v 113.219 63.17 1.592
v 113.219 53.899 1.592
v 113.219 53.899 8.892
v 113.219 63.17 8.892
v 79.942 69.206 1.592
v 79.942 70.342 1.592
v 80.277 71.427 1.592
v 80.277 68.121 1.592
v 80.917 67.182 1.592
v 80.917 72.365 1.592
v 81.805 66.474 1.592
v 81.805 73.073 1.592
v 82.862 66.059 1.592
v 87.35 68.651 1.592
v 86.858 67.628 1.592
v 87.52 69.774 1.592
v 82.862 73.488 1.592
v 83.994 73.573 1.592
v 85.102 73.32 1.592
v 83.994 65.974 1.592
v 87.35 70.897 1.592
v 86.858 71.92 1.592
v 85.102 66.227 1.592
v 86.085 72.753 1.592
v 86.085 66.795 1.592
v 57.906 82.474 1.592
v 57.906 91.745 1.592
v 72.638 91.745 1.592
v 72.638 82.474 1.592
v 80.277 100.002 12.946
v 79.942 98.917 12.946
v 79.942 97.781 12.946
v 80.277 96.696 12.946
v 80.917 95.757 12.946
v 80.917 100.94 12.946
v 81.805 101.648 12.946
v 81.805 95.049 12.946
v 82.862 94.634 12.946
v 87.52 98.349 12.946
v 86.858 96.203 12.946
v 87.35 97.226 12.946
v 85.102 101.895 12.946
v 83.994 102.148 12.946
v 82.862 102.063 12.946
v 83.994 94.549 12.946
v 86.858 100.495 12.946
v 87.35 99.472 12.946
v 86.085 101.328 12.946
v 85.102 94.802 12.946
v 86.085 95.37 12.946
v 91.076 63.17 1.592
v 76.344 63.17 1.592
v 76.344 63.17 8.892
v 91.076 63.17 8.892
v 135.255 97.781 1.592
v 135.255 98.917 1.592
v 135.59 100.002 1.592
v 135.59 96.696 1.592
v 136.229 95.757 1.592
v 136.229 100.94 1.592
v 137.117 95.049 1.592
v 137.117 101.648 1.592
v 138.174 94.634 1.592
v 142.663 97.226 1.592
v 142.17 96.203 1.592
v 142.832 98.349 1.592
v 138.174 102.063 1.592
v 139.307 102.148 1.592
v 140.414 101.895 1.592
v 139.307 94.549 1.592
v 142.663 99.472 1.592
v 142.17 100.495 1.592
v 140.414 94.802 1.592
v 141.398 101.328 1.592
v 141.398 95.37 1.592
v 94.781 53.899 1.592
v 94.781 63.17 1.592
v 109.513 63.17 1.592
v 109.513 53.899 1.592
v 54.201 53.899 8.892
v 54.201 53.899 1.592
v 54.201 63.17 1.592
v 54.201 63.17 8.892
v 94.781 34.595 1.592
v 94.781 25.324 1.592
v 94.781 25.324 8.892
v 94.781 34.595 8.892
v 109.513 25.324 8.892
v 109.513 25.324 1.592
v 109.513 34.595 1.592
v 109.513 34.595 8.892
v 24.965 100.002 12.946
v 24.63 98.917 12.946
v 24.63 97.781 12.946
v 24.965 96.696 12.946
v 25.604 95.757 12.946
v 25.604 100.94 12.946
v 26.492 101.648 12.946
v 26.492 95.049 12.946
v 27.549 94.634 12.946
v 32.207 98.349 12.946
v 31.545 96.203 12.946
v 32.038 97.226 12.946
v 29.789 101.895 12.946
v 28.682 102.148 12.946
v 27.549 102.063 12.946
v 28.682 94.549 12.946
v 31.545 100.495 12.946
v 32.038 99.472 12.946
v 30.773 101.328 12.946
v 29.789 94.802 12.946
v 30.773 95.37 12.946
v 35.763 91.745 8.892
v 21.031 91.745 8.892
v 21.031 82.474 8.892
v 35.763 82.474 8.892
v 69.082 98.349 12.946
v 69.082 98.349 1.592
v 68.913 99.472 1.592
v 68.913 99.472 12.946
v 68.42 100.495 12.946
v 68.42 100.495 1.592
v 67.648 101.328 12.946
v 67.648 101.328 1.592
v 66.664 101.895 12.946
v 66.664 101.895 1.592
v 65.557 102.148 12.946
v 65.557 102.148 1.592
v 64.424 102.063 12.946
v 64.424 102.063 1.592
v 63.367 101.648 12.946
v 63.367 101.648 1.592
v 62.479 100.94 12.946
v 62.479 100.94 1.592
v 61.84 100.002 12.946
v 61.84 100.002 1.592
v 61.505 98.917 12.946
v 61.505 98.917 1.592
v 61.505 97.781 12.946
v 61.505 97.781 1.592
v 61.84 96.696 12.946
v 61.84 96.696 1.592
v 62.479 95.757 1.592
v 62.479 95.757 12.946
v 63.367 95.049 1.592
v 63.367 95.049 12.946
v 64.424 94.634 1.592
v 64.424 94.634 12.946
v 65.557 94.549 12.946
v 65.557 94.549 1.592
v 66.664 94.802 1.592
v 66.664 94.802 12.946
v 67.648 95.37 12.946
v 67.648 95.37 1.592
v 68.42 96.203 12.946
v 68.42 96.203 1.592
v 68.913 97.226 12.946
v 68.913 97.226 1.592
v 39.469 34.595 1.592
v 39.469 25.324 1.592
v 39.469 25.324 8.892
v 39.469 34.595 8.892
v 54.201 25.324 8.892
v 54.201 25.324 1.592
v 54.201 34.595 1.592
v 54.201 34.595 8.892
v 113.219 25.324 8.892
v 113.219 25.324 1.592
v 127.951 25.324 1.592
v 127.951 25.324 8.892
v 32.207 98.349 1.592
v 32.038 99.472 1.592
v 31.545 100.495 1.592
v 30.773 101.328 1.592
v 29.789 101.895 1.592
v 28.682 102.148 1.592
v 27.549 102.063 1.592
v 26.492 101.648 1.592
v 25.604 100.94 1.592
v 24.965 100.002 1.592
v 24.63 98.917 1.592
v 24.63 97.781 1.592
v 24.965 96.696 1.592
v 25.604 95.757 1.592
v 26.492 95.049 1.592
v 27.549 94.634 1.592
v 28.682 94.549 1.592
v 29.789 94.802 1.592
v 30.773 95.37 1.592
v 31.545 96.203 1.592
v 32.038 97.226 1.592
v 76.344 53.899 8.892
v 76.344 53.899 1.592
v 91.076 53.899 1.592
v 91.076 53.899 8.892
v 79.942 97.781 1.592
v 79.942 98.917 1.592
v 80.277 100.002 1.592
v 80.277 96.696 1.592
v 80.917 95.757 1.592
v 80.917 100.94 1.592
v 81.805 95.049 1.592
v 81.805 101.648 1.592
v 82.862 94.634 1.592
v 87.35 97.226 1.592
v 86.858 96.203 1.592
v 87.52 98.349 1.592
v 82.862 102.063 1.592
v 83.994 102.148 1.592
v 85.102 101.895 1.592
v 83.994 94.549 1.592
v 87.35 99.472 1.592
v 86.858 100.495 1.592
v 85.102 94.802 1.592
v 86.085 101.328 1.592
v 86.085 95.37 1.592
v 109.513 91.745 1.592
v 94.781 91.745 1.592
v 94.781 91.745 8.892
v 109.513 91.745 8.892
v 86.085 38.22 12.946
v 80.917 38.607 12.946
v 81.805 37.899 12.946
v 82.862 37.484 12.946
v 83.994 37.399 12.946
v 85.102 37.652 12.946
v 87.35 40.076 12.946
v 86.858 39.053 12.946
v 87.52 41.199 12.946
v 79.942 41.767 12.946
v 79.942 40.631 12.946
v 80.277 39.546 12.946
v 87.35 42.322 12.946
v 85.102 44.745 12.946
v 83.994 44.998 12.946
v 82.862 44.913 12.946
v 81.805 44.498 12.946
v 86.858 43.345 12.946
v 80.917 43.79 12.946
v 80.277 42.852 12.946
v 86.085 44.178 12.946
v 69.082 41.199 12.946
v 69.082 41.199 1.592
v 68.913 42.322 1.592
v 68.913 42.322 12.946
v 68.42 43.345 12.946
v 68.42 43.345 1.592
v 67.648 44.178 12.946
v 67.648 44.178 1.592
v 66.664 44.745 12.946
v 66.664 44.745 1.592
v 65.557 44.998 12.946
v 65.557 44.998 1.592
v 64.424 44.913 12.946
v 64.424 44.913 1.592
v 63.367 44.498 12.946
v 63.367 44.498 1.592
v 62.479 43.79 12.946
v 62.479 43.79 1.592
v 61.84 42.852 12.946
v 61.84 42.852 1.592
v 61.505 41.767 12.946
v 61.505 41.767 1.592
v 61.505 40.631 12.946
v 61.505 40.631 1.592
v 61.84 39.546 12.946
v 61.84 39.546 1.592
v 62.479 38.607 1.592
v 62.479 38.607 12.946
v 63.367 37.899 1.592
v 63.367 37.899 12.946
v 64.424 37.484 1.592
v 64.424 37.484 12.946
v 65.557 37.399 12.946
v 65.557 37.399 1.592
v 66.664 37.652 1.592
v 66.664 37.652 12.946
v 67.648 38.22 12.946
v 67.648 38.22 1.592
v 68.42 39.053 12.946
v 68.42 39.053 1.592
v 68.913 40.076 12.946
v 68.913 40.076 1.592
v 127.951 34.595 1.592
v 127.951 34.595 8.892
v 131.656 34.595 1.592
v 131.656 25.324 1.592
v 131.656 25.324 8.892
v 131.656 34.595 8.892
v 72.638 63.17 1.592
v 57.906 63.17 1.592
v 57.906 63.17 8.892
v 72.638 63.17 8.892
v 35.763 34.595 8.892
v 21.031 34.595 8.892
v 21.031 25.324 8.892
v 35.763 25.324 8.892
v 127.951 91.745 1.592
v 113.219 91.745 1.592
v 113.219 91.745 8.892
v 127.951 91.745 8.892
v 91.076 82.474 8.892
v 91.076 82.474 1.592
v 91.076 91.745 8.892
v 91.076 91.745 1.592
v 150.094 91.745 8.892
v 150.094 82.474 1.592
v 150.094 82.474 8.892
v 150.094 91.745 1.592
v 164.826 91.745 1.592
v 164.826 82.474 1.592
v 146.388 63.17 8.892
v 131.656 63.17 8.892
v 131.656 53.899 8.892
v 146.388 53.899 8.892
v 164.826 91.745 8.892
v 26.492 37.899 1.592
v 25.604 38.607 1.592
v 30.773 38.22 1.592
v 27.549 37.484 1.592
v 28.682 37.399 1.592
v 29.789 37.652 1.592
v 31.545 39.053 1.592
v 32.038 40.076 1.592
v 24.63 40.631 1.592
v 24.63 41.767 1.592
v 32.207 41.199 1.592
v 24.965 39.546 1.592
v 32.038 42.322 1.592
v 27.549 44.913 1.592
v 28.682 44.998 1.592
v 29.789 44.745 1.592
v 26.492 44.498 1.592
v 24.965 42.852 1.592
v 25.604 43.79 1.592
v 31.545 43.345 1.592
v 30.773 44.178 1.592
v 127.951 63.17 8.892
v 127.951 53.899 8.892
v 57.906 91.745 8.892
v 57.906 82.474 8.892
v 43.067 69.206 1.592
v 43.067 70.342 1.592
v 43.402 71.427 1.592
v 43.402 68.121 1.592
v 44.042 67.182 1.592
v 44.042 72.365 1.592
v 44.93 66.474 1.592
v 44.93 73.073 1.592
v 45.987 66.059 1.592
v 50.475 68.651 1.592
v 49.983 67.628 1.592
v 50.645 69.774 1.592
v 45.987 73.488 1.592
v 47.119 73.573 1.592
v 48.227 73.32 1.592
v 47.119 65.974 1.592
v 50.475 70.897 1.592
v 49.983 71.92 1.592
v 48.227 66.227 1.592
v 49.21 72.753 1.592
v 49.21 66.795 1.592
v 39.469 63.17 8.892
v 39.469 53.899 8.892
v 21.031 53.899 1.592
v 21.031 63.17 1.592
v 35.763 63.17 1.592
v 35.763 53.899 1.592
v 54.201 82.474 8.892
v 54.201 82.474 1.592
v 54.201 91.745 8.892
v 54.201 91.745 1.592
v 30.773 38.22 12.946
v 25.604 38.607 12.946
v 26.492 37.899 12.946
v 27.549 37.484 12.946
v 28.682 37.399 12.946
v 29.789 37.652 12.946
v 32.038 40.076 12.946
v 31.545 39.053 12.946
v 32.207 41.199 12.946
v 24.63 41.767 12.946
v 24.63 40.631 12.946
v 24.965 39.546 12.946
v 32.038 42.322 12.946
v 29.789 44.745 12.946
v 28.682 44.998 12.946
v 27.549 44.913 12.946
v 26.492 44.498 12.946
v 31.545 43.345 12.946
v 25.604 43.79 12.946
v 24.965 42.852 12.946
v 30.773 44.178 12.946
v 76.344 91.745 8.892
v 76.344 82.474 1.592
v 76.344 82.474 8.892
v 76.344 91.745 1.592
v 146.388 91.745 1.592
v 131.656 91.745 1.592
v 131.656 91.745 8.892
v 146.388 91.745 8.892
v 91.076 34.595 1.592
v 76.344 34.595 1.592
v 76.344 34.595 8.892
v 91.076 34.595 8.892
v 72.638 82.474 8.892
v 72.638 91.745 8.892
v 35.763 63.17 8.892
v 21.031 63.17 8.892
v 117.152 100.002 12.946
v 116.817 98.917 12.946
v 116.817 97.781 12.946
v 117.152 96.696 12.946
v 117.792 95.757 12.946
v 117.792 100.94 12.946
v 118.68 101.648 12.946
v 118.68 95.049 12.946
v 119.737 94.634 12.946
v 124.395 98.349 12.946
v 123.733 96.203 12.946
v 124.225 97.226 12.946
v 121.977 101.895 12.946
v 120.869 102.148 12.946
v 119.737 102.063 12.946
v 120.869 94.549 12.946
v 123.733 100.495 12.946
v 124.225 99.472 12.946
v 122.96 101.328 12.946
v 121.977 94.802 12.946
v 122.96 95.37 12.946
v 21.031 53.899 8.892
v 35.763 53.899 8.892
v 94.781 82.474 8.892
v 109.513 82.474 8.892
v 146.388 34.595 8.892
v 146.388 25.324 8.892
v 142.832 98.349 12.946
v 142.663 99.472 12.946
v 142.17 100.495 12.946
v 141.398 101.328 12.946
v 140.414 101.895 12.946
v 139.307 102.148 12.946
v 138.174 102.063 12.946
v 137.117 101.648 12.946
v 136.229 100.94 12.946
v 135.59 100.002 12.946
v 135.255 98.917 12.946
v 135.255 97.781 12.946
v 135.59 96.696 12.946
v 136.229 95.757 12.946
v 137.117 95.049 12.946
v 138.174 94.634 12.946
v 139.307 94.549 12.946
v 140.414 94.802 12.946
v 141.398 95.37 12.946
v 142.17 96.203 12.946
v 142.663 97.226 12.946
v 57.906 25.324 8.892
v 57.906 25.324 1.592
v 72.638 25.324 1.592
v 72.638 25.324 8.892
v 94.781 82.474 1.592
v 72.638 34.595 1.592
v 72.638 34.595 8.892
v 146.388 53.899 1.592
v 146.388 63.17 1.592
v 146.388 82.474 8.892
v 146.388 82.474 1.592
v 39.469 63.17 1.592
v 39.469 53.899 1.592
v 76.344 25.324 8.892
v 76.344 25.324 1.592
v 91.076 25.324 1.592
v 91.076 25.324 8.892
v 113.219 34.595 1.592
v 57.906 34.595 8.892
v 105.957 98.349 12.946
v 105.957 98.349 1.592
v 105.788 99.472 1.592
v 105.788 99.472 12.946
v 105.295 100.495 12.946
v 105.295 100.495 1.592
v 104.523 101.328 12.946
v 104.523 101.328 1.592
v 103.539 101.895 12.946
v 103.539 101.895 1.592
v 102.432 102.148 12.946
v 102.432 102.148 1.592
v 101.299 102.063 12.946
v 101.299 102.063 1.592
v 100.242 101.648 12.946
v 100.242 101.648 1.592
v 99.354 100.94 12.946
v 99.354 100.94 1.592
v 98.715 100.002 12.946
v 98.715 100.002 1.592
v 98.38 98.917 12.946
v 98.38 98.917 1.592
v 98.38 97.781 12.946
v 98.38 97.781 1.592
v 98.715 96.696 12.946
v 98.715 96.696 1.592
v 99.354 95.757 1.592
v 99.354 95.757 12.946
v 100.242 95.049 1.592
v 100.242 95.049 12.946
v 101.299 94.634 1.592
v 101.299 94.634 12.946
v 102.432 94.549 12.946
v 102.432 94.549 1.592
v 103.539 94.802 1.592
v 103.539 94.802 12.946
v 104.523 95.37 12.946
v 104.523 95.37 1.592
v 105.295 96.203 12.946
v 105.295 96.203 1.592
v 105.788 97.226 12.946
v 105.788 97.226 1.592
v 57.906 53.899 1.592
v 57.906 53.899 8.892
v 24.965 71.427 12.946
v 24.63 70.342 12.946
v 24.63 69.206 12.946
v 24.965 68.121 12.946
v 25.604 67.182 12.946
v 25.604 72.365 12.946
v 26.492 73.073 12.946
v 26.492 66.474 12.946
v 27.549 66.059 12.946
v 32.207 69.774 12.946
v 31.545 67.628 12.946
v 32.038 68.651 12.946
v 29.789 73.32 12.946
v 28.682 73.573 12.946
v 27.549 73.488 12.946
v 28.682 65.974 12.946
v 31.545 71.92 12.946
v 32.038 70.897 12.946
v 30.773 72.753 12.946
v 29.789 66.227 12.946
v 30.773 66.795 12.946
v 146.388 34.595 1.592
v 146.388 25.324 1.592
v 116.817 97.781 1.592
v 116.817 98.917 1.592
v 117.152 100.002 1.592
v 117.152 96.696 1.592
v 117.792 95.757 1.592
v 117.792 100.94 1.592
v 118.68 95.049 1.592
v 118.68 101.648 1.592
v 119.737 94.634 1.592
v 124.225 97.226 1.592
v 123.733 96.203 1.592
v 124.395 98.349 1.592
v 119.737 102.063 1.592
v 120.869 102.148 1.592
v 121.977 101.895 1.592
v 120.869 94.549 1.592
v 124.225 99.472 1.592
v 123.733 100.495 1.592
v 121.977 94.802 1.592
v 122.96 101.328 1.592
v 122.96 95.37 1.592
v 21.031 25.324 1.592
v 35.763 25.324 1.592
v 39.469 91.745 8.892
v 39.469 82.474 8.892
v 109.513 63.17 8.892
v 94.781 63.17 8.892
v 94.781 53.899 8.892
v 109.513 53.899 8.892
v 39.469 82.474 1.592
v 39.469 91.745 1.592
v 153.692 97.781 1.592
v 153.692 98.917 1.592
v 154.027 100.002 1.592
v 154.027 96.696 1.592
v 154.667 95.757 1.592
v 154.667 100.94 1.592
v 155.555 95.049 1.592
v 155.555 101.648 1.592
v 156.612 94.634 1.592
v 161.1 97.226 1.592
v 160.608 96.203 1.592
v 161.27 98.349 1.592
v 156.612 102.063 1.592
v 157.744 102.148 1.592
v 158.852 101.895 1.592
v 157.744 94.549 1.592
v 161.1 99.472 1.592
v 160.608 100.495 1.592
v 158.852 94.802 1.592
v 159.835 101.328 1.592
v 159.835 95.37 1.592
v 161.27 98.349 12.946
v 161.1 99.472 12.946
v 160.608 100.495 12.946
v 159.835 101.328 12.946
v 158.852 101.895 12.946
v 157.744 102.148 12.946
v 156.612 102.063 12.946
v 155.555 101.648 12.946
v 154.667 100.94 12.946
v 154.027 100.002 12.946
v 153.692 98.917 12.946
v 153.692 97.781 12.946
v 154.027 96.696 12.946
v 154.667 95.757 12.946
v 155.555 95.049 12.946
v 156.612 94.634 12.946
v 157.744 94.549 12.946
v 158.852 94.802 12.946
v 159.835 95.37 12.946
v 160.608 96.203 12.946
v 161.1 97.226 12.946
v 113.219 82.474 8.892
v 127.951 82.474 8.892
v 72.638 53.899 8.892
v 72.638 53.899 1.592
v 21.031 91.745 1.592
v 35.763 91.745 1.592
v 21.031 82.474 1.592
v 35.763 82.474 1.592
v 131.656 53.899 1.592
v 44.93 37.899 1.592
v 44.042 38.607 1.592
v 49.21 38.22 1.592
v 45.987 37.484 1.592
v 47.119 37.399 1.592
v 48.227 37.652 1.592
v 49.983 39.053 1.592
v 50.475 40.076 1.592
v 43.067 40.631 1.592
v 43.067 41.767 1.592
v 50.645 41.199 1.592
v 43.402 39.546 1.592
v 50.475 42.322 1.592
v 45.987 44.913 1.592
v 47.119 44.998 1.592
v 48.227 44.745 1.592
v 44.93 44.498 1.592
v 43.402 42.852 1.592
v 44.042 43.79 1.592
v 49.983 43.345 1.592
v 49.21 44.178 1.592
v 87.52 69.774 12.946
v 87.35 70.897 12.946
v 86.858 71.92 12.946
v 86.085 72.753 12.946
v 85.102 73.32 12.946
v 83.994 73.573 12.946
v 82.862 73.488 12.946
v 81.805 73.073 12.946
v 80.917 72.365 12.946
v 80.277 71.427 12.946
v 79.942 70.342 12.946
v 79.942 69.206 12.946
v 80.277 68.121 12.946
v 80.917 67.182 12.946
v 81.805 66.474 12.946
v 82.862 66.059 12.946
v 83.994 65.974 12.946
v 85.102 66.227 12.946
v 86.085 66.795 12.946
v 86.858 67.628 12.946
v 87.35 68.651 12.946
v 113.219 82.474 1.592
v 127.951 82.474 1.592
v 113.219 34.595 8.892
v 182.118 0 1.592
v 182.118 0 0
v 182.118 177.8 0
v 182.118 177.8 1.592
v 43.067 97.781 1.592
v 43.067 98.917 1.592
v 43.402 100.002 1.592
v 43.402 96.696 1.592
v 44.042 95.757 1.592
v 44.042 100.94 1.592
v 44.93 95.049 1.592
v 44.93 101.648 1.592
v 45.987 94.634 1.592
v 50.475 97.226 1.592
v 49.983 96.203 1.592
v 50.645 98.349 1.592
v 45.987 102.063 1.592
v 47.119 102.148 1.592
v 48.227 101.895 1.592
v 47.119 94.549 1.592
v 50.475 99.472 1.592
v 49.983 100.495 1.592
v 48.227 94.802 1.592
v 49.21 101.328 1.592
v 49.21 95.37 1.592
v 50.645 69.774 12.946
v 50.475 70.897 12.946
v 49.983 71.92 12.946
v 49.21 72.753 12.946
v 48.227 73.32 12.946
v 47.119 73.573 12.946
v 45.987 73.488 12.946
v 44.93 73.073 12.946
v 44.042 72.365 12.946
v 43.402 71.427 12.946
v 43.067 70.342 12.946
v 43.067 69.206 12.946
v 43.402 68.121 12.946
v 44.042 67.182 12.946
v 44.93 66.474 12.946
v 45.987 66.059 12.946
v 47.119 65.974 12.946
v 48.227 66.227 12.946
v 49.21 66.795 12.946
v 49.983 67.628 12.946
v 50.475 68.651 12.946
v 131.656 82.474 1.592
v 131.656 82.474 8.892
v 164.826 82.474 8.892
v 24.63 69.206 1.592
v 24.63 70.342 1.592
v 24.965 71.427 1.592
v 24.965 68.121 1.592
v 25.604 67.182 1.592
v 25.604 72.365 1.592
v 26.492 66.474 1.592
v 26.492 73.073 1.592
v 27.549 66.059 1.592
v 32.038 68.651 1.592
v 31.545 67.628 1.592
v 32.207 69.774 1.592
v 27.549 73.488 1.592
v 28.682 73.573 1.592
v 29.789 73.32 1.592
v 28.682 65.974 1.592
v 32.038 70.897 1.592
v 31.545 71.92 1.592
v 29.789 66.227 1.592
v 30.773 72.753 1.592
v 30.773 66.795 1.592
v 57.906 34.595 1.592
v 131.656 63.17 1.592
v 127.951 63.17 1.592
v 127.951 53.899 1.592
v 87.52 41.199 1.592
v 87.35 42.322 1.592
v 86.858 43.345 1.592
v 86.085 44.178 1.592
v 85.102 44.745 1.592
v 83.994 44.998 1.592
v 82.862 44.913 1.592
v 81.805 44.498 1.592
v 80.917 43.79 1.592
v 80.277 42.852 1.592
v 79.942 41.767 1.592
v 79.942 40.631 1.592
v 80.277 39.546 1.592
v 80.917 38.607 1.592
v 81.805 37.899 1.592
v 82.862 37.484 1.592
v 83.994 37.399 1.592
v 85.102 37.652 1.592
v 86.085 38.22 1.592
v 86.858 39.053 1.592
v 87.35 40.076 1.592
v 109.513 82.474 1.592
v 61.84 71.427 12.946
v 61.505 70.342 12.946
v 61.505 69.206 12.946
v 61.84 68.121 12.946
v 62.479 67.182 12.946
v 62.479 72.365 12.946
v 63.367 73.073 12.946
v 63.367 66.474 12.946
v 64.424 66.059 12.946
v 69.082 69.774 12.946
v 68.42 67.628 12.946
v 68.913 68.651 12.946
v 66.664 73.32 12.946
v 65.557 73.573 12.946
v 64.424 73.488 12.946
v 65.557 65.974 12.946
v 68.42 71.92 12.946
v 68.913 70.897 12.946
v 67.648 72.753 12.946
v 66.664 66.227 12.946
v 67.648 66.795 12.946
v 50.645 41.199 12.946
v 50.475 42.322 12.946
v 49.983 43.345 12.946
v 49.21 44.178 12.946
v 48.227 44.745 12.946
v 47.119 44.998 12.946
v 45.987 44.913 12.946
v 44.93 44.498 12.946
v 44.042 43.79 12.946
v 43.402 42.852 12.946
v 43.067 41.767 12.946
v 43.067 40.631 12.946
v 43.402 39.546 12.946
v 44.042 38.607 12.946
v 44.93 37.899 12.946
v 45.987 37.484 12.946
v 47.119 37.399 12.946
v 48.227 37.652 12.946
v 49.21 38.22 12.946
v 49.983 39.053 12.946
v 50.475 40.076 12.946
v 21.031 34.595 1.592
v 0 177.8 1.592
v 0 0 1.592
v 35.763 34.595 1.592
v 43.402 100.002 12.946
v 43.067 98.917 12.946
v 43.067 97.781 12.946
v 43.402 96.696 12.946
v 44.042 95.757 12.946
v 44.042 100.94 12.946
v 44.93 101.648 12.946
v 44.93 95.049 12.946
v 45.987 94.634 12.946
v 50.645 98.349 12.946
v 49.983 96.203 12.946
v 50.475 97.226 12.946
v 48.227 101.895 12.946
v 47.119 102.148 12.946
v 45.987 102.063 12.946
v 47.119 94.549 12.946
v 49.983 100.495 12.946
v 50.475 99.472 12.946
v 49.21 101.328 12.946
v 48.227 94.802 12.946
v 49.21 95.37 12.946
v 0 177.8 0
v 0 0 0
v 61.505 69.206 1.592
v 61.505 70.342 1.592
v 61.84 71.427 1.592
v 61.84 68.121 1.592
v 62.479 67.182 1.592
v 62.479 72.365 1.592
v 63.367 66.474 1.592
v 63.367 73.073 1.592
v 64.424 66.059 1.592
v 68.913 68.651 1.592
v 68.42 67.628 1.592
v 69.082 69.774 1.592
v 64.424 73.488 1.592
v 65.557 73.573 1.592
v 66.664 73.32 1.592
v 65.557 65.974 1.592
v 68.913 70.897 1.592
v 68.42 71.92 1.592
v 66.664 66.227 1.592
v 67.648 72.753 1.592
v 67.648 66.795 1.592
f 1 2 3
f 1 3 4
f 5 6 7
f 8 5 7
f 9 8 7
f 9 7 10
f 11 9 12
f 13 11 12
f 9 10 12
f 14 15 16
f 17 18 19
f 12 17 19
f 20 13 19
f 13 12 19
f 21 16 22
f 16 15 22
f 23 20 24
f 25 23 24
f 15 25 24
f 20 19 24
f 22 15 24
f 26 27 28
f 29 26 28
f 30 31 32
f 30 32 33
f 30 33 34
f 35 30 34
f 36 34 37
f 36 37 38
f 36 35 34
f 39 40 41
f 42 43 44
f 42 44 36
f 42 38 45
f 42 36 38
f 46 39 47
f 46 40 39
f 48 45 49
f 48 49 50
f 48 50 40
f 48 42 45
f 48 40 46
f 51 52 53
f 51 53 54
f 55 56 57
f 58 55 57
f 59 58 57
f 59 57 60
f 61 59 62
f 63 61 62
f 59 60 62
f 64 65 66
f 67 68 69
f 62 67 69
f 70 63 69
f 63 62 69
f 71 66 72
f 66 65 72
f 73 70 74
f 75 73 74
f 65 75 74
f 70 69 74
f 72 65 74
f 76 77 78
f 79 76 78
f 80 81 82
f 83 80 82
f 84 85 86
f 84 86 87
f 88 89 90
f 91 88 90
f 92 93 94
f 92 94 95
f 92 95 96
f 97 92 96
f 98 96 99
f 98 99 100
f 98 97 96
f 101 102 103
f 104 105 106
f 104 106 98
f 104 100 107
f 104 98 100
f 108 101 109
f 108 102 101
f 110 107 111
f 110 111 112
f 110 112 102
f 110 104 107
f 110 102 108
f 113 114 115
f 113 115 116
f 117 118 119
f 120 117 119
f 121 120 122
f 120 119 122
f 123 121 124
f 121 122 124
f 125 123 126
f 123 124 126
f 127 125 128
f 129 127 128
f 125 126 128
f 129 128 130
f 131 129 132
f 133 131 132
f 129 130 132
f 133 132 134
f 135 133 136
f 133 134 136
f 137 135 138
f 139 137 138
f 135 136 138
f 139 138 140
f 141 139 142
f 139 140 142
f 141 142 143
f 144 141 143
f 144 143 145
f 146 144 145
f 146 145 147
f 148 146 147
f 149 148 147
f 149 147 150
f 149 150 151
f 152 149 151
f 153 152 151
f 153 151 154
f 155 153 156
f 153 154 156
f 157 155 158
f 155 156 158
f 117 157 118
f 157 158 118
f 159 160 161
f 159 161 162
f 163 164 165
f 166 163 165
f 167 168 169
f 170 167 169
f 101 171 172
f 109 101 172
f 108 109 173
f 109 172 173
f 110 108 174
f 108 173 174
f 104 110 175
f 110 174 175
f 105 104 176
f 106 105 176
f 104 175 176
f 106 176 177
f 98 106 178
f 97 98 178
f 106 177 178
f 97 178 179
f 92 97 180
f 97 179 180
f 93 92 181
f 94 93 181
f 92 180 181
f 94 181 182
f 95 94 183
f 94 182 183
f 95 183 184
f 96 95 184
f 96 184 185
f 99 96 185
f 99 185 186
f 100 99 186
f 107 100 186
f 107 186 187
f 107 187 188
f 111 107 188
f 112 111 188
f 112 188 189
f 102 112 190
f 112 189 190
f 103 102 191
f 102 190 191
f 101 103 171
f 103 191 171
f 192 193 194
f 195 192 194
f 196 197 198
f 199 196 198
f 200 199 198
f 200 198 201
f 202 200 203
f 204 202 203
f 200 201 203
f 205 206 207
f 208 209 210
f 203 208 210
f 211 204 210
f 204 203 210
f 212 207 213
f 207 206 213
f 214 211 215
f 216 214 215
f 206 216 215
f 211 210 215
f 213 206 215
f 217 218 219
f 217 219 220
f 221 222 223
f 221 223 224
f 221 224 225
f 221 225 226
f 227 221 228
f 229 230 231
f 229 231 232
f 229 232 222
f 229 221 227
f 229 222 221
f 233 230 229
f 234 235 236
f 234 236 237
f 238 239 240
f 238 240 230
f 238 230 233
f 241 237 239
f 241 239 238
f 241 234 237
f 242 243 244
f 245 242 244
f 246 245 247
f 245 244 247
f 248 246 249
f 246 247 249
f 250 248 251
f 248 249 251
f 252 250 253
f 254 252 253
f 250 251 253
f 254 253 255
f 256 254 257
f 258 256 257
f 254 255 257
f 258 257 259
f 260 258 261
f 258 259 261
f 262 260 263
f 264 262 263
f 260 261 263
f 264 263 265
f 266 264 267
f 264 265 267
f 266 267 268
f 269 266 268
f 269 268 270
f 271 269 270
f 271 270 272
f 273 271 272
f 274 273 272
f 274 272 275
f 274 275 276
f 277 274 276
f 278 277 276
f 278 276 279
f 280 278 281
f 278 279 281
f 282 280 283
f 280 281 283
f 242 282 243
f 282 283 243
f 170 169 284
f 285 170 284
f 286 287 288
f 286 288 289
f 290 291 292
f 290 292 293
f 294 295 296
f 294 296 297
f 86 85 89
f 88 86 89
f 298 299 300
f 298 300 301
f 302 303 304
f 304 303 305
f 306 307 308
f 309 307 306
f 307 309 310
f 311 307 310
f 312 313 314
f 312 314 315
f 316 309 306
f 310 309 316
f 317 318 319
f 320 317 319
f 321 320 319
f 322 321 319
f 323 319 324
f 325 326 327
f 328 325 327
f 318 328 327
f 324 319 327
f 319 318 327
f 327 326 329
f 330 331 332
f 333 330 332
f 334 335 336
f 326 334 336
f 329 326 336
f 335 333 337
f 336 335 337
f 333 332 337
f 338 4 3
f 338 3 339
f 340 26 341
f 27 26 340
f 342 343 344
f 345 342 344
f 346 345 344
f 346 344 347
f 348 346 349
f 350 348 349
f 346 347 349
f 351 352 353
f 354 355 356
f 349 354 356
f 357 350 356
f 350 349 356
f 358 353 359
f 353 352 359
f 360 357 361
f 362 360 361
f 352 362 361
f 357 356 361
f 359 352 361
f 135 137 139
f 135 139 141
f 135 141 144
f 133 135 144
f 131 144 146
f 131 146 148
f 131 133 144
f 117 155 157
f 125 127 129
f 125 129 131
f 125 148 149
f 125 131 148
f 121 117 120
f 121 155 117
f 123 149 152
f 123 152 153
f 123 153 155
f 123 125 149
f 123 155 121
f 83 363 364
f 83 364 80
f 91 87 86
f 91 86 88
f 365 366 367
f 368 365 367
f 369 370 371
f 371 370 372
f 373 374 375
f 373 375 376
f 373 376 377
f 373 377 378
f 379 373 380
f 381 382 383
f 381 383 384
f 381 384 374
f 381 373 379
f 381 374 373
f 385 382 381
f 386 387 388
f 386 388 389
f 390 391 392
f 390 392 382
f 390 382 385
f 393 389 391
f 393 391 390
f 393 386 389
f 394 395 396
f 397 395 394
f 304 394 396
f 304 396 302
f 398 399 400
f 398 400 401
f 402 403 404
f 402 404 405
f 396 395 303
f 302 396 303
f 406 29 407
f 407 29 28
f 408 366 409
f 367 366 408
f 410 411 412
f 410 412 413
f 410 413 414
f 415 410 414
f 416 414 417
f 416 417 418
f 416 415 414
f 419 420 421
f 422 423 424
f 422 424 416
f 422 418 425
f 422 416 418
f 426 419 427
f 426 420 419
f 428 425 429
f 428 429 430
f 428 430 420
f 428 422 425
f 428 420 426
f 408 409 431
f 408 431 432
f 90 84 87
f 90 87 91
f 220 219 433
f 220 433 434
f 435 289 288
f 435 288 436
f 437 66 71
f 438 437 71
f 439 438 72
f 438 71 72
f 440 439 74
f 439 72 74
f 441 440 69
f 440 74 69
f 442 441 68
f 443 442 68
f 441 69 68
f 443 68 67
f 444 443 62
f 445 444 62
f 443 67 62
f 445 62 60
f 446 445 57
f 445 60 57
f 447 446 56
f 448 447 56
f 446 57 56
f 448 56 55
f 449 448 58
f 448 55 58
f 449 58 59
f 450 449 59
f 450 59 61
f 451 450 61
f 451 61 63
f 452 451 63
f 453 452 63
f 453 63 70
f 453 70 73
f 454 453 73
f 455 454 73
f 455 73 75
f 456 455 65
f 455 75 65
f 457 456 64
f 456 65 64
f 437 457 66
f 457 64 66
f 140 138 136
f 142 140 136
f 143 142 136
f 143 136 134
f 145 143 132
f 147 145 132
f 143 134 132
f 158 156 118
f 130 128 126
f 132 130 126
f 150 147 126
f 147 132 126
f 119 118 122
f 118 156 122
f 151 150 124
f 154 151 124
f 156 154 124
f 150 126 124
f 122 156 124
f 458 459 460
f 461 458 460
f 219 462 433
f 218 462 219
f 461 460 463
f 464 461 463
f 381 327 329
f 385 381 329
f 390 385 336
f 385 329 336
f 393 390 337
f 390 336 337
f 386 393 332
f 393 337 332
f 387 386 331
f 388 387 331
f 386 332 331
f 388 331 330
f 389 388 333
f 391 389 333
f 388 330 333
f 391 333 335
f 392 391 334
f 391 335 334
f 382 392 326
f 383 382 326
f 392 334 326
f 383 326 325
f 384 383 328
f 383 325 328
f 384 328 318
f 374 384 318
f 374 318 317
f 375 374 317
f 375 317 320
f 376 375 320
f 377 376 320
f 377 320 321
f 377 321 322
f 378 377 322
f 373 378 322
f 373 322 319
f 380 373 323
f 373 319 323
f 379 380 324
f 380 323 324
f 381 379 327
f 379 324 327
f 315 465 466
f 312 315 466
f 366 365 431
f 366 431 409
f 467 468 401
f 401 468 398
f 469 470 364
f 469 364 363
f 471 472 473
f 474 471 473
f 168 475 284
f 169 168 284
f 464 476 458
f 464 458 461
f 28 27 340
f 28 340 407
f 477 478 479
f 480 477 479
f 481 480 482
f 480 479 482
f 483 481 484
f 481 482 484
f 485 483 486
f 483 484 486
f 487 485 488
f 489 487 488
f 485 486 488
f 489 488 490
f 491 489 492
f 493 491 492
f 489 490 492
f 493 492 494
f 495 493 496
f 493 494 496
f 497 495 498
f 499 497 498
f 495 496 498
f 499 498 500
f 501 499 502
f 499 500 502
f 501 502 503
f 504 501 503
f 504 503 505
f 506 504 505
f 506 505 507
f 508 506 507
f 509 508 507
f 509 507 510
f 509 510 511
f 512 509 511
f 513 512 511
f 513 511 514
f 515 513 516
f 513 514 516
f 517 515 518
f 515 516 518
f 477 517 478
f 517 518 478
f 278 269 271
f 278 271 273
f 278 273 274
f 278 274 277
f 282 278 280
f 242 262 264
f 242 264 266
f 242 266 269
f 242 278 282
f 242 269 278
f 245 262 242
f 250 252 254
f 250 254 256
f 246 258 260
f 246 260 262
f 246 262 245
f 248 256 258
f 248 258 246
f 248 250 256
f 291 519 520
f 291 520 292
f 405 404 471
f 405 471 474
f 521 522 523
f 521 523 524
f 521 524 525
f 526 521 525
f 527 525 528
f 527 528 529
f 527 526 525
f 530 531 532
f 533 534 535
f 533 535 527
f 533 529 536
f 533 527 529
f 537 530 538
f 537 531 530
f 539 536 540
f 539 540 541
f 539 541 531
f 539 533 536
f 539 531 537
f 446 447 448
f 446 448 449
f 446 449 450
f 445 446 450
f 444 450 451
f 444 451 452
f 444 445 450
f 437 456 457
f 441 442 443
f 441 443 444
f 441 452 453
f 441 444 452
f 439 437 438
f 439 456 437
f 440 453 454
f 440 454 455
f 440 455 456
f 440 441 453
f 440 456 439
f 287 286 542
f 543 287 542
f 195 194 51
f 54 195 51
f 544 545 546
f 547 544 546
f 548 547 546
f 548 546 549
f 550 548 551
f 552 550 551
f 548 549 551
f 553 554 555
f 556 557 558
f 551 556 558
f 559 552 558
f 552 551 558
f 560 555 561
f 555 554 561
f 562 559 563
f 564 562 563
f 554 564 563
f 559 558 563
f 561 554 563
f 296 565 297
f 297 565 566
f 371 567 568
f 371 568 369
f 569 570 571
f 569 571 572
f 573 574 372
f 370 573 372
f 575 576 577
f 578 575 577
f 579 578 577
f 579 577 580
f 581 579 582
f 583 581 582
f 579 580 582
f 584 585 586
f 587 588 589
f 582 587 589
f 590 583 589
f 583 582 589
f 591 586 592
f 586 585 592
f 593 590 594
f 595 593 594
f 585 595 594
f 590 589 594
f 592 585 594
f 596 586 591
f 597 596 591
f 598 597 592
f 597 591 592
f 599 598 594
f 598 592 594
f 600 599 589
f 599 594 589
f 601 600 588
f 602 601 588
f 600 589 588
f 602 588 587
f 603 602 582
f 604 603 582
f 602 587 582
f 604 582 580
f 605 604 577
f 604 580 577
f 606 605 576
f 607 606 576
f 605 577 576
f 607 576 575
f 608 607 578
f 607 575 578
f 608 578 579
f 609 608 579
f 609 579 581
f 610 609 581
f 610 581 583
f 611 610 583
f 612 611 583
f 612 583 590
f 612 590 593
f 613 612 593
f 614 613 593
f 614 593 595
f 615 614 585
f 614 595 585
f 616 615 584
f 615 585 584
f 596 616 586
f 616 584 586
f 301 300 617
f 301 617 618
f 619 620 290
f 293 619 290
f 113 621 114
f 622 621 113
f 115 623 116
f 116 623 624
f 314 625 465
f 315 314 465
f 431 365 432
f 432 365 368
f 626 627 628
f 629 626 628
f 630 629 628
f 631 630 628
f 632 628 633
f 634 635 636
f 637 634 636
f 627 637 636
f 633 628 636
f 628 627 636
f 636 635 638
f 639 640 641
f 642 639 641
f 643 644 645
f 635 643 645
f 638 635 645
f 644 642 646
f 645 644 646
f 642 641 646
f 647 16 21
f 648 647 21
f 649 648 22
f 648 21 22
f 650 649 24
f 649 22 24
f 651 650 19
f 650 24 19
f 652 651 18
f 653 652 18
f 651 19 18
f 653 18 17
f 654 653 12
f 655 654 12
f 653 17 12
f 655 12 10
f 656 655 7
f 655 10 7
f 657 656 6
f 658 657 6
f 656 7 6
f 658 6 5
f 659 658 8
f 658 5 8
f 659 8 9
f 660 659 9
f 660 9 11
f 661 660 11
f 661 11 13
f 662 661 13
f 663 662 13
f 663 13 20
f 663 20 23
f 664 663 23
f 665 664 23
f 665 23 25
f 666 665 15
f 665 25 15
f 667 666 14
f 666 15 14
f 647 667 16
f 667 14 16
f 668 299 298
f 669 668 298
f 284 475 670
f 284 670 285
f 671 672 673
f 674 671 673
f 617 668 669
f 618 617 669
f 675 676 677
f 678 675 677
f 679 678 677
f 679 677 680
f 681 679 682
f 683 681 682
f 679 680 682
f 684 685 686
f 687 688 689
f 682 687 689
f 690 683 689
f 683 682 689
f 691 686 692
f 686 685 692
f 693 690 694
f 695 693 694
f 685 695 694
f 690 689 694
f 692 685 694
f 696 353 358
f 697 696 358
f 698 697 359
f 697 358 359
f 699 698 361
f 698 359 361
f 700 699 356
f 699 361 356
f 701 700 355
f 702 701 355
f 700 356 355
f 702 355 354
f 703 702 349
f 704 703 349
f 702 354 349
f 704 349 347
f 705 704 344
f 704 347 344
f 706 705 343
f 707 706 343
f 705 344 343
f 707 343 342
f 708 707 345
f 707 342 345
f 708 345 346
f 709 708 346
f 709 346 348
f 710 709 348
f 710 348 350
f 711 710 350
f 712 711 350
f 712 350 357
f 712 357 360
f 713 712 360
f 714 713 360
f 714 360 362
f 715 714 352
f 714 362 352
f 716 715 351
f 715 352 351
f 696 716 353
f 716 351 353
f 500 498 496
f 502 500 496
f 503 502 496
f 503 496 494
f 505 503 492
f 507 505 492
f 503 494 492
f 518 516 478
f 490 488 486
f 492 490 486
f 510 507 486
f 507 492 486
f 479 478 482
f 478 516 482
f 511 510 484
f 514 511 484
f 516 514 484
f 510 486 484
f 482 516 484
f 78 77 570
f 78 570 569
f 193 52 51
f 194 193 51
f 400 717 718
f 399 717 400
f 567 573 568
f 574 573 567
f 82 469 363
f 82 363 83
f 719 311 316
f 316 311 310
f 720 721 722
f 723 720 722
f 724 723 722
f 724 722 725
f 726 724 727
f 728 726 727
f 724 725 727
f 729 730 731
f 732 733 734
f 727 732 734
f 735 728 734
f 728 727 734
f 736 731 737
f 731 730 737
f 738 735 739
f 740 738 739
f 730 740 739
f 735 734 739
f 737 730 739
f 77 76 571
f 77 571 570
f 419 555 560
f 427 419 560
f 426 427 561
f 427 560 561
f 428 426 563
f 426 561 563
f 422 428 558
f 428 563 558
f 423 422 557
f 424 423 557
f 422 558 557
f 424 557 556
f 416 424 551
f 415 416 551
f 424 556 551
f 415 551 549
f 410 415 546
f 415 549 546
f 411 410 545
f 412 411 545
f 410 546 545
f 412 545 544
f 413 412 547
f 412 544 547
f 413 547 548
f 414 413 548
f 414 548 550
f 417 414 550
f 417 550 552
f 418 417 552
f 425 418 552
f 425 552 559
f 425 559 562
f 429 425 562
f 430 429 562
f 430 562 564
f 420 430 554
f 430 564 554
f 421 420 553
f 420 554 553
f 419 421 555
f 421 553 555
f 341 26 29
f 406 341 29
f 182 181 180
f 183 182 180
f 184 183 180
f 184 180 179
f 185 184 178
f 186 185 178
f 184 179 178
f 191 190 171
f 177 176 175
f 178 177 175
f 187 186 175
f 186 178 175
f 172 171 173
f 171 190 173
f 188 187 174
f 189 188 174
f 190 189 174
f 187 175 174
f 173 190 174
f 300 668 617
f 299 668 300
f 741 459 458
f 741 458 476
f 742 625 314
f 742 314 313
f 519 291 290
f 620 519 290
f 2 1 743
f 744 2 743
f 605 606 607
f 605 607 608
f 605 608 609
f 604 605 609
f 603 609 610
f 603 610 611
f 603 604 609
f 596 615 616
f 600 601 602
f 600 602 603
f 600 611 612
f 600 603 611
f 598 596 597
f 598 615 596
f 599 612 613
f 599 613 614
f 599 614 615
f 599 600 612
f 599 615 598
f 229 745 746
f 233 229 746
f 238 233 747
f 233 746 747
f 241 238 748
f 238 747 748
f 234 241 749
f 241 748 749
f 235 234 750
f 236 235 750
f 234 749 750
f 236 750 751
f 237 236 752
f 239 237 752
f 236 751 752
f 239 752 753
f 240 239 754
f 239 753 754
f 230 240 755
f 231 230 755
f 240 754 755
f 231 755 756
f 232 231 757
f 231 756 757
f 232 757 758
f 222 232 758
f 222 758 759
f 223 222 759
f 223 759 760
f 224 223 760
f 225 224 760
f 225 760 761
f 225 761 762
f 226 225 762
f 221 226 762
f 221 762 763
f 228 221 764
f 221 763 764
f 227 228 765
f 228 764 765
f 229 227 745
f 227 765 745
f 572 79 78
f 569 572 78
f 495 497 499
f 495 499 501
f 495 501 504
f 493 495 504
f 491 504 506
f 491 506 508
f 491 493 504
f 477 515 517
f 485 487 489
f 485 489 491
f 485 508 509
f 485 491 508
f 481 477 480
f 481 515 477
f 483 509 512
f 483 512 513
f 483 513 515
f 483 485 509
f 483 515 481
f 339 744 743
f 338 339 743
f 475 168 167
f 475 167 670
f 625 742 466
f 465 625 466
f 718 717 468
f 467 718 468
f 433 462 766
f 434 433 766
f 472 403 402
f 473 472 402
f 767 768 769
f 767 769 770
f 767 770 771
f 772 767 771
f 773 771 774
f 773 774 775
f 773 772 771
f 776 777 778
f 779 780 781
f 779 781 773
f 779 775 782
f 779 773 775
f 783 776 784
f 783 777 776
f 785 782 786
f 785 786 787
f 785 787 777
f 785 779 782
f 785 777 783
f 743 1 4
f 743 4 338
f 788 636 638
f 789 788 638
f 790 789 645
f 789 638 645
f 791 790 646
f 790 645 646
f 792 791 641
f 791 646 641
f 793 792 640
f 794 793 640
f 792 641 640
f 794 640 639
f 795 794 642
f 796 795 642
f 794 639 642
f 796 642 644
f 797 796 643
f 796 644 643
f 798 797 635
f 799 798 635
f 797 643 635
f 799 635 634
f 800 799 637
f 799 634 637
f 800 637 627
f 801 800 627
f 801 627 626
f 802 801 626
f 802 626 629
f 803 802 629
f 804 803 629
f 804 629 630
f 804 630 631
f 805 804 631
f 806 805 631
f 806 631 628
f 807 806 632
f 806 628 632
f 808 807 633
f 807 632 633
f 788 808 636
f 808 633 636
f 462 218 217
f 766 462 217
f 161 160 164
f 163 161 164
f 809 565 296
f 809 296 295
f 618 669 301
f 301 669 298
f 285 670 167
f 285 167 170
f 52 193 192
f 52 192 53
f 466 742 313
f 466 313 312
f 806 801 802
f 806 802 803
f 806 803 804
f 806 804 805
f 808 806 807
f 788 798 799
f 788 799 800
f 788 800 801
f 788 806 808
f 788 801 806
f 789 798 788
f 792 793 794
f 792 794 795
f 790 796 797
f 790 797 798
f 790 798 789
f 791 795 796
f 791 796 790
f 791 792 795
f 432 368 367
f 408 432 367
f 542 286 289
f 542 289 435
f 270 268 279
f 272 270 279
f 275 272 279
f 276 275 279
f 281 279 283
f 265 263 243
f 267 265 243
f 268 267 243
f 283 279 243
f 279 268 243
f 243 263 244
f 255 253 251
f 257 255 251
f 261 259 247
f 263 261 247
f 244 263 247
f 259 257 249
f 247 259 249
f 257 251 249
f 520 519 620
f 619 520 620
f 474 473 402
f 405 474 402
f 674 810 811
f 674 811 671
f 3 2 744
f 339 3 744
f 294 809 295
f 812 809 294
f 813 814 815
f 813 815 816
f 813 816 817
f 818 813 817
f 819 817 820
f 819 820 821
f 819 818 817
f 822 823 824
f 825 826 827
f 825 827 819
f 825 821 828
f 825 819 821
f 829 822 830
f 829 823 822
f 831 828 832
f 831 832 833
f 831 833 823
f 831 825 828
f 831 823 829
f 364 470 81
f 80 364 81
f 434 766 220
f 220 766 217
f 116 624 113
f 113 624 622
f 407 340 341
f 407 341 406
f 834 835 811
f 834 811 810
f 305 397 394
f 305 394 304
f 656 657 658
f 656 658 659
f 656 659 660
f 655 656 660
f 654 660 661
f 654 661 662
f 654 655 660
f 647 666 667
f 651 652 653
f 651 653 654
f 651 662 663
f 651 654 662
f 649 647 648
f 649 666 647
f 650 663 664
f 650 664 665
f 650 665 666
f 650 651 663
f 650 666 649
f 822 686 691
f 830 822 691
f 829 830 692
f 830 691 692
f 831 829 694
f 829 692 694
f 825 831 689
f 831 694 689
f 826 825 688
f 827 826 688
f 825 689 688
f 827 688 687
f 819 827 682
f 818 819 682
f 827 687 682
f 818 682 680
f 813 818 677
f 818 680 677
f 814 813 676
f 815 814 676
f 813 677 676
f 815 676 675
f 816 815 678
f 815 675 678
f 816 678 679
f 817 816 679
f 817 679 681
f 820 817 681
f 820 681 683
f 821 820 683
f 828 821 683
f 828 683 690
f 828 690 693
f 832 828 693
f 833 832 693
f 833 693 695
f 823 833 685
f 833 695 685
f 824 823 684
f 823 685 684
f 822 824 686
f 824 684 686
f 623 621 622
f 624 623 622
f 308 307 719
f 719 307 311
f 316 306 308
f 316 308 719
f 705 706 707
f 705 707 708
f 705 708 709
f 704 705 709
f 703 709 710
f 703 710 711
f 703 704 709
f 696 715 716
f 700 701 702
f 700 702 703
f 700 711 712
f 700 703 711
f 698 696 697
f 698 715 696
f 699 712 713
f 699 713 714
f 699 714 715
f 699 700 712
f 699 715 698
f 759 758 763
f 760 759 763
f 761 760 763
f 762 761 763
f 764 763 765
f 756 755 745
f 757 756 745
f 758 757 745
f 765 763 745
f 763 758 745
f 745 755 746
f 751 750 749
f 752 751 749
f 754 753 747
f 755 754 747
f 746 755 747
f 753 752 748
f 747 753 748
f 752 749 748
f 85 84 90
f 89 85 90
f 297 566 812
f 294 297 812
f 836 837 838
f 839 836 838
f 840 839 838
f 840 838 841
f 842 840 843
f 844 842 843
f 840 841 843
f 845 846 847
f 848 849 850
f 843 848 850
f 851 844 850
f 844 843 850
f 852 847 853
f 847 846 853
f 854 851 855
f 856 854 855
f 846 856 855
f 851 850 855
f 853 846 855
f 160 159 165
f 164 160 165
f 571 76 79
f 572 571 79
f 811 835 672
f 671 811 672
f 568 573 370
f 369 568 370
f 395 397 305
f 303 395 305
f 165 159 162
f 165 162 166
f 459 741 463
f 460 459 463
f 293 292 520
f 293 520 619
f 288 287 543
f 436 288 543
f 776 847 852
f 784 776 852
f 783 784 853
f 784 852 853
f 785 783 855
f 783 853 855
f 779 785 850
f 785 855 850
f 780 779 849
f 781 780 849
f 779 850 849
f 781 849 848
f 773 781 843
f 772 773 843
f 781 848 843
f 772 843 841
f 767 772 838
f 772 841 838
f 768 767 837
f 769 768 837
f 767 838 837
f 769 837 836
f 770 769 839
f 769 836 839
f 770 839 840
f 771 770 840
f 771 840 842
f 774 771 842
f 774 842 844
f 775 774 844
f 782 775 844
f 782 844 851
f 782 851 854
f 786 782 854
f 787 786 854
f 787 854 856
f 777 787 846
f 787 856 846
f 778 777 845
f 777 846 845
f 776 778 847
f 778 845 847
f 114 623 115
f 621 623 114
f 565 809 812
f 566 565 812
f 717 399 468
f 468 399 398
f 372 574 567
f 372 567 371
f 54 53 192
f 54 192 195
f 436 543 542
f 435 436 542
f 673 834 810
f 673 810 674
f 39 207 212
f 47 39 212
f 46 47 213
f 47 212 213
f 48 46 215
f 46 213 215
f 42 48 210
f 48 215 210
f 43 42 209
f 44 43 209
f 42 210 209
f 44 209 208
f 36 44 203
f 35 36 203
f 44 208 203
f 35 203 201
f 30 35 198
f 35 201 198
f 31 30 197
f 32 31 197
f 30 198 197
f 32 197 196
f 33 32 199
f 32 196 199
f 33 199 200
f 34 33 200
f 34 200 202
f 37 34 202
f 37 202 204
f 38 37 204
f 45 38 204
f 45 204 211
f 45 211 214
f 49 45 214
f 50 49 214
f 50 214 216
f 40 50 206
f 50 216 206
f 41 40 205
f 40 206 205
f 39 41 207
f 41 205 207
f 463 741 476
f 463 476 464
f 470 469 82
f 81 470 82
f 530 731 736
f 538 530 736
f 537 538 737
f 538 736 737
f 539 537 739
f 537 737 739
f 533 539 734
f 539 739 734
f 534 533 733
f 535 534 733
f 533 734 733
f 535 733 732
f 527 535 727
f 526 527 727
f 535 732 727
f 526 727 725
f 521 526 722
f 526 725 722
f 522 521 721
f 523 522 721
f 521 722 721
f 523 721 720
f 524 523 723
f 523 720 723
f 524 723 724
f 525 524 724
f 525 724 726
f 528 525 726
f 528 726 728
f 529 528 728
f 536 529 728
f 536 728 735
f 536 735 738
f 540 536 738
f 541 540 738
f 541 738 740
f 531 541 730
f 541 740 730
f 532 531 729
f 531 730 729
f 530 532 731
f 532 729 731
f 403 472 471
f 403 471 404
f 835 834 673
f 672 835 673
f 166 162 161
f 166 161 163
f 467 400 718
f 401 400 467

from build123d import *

# Parameters (mm, degrees)
SKETCH1_W                       = 182.118
SKETCH1_H                       = 177.8
BOARD_DEPTH                     = 1.592072
SKETCH2_R                       = 3.81
LED_KINGBRIGHT_3P_2P54_1_DEPTH  = 11.3538
SKETCH3_R                       = 3.81
LED_KINGBRIGHT_3P_2P54_2_DEPTH  = 11.3538
SKETCH4_R                       = 3.81
LED_KINGBRIGHT_3P_2P54_3_DEPTH  = 11.3538
SKETCH5_R                       = 3.81
LED_KINGBRIGHT_3P_2P54_4_DEPTH  = 11.3538
SKETCH6_R                       = 3.81
LED_KINGBRIGHT_3P_2P54_5_DEPTH  = 11.3538
SKETCH7_R                       = 3.81
LED_KINGBRIGHT_3P_2P54_6_DEPTH  = 11.3538
SKETCH8_R                       = 3.81
LED_KINGBRIGHT_3P_2P54_7_DEPTH  = 11.3538
SKETCH9_R                       = 3.81
LED_KINGBRIGHT_3P_2P54_8_DEPTH  = 11.3538
SKETCH10_R                      = 3.81
LED_KINGBRIGHT_3P_2P54_9_DEPTH  = 11.3538
SKETCH11_R                      = 3.81
LED_KINGBRIGHT_3P_2P54_10_DEPTH = 11.3538
SKETCH12_R                      = 3.81
LED_KINGBRIGHT_3P_2P54_11_DEPTH = 11.3538
SKETCH13_R                      = 3.81
LED_KINGBRIGHT_3P_2P54_12_DEPTH = 11.3538
SKETCH14_R                      = 3.81
LED_KINGBRIGHT_3P_2P54_13_DEPTH = 11.3538
SKETCH15_R                      = 3.81
LED_KINGBRIGHT_3P_2P54_14_DEPTH = 11.3538
SKETCH16_R                      = 3.81
LED_KINGBRIGHT_3P_2P54_15_DEPTH = 11.3538
SKETCH17_R                      = 3.81
LED_KINGBRIGHT_3P_2P54_16_DEPTH = 11.3538
SKETCH18_W                      = 14.732
SKETCH18_H                      = 9.271
SWITCH_MCDTS2_1_DEPTH           = 7.3000108
SKETCH19_W                      = 14.732
SKETCH19_H                      = 9.271
SWITCH_MCDTS2_2_DEPTH           = 7.3000108
SKETCH20_W                      = 14.732
SKETCH20_H                      = 9.271
SWITCH_MCDTS2_3_DEPTH           = 7.3000108
SKETCH21_W                      = 14.732
SKETCH21_H                      = 9.271
SWITCH_MCDTS2_4_DEPTH           = 7.3000108
SKETCH22_W                      = 14.732
SKETCH22_H                      = 9.271
SWITCH_MCDTS2_5_DEPTH           = 7.3000108
SKETCH23_W                      = 14.732
SKETCH23_H                      = 9.271
SWITCH_MCDTS2_6_DEPTH           = 7.3000108
SKETCH24_W                      = 14.732
SKETCH24_H                      = 9.271
SWITCH_MCDTS2_7_DEPTH           = 7.3000108
SKETCH25_W                      = 14.732
SKETCH25_H                      = 9.271
SWITCH_MCDTS2_8_DEPTH           = 7.3000108
SKETCH26_W                      = 14.732
SKETCH26_H                      = 9.271
SWITCH_MCDTS2_9_DEPTH           = 7.3000108
SKETCH27_W                      = 14.732
SKETCH27_H                      = 9.271
SWITCH_MCDTS2_10_DEPTH          = 7.3000108
SKETCH28_W                      = 14.732
SKETCH28_H                      = 9.271
SWITCH_MCDTS2_11_DEPTH          = 7.3000108
SKETCH29_W                      = 14.732
SKETCH29_H                      = 9.271
SWITCH_MCDTS2_12_DEPTH          = 7.3000108
SKETCH30_W                      = 14.732
SKETCH30_H                      = 9.271
SWITCH_MCDTS2_13_DEPTH          = 7.3000108
SKETCH31_W                      = 14.732
SKETCH31_H                      = 9.271
SWITCH_MCDTS2_14_DEPTH          = 7.3000108
SKETCH32_W                      = 14.732
SKETCH32_H                      = 9.271
SWITCH_MCDTS2_15_DEPTH          = 7.3000108
SKETCH33_W                      = 14.732
SKETCH33_H                      = 9.271
SWITCH_MCDTS2_16_DEPTH          = 7.3000108
SKETCH34_W                      = 14.732
SKETCH34_H                      = 9.271
SWITCH_MCDTS2_17_DEPTH          = 7.3000108
SKETCH35_W                      = 14.732
SKETCH35_H                      = 9.271
SWITCH_MCDTS2_18_DEPTH          = 7.3000108
SKETCH36_W                      = 14.732
SKETCH36_H                      = 9.271
SWITCH_MCDTS2_19_DEPTH          = 7.3000108
SKETCH37_W                      = 14.732
SKETCH37_H                      = 9.271
SWITCH_MCDTS2_20_DEPTH          = 7.3000108
SKETCH38_W                      = 14.732
SKETCH38_H                      = 9.271
SWITCH_MCDTS2_21_DEPTH          = 7.3000108
SKETCH39_W                      = 14.732
SKETCH39_H                      = 9.271
SWITCH_MCDTS2_22_DEPTH          = 7.3000108


with BuildPart() as part:
    # Sketch1 → BOARD (new body)
    with BuildSketch(Plane.XY):
        with Locations((91.059, 88.9)):
            Rectangle(SKETCH1_W, SKETCH1_H)
    extrude(amount=BOARD_DEPTH)


with BuildPart() as body_2:
    # Sketch2 → LED-KINGBRIGHT_3P_2P54-1 (new body)
    with BuildSketch(Plane.XY.offset(1.592072)):
        with Locations((83.7097132, 41.1988)):
            Circle(SKETCH2_R)
    extrude(amount=LED_KINGBRIGHT_3P_2P54_1_DEPTH)


with BuildPart() as body_3:
    # Sketch3 → LED-KINGBRIGHT_3P_2P54-2 (new body)
    with BuildSketch(Plane.XY.offset(1.592072)):
        with Locations((65.2722088, 41.1988)):
            Circle(SKETCH3_R)
    extrude(amount=LED_KINGBRIGHT_3P_2P54_2_DEPTH)


with BuildPart() as body_4:
    # Sketch4 → LED-KINGBRIGHT_3P_2P54-3 (new body)
    with BuildSketch(Plane.XY.offset(1.592072)):
        with Locations((46.8347044, 41.1988)):
            Circle(SKETCH4_R)
    extrude(amount=LED_KINGBRIGHT_3P_2P54_3_DEPTH)


with BuildPart() as body_5:
    # Sketch5 → LED-KINGBRIGHT_3P_2P54-4 (new body)
    with BuildSketch(Plane.XY.offset(1.592072)):
        with Locations((28.3972, 41.1988)):
            Circle(SKETCH5_R)
    extrude(amount=LED_KINGBRIGHT_3P_2P54_4_DEPTH)


with BuildPart() as body_6:
    # Sketch6 → LED-KINGBRIGHT_3P_2P54-5 (new body)
    with BuildSketch(Plane.XY.offset(1.592072)):
        with Locations((83.7097132, 69.7738)):
            Circle(SKETCH6_R)
    extrude(amount=LED_KINGBRIGHT_3P_2P54_5_DEPTH)


with BuildPart() as body_7:
    # Sketch7 → LED-KINGBRIGHT_3P_2P54-6 (new body)
    with BuildSketch(Plane.XY.offset(1.592072)):
        with Locations((65.2722088, 69.7738)):
            Circle(SKETCH7_R)
    extrude(amount=LED_KINGBRIGHT_3P_2P54_6_DEPTH)


with BuildPart() as body_8:
    # Sketch8 → LED-KINGBRIGHT_3P_2P54-7 (new body)
    with BuildSketch(Plane.XY.offset(1.592072)):
        with Locations((46.8347044, 69.7738)):
            Circle(SKETCH8_R)
    extrude(amount=LED_KINGBRIGHT_3P_2P54_7_DEPTH)


with BuildPart() as body_9:
    # Sketch9 → LED-KINGBRIGHT_3P_2P54-8 (new body)
    with BuildSketch(Plane.XY.offset(1.592072)):
        with Locations((28.3972, 69.7738)):
            Circle(SKETCH9_R)
    extrude(amount=LED_KINGBRIGHT_3P_2P54_8_DEPTH)


with BuildPart() as body_10:
    # Sketch10 → LED-KINGBRIGHT_3P_2P54-9 (new body)
    with BuildSketch(Plane.XY.offset(1.592072)):
        with Locations((157.4597308, 98.3488)):
            Circle(SKETCH10_R)
    extrude(amount=LED_KINGBRIGHT_3P_2P54_9_DEPTH)


with BuildPart() as body_11:
    # Sketch11 → LED-KINGBRIGHT_3P_2P54-10 (new body)
    with BuildSketch(Plane.XY.offset(1.592072)):
        with Locations((139.0222264, 98.3488)):
            Circle(SKETCH11_R)
    extrude(amount=LED_KINGBRIGHT_3P_2P54_10_DEPTH)


with BuildPart() as body_12:
    # Sketch12 → LED-KINGBRIGHT_3P_2P54-11 (new body)
    with BuildSketch(Plane.XY.offset(1.592072)):
        with Locations((120.584722, 98.3488)):
            Circle(SKETCH12_R)
    extrude(amount=LED_KINGBRIGHT_3P_2P54_11_DEPTH)


with BuildPart() as body_13:
    # Sketch13 → LED-KINGBRIGHT_3P_2P54-12 (new body)
    with BuildSketch(Plane.XY.offset(1.592072)):
        with Locations((102.1472176, 98.3488)):
            Circle(SKETCH13_R)
    extrude(amount=LED_KINGBRIGHT_3P_2P54_12_DEPTH)


with BuildPart() as body_14:
    # Sketch14 → LED-KINGBRIGHT_3P_2P54-13 (new body)
    with BuildSketch(Plane.XY.offset(1.592072)):
        with Locations((83.7097132, 98.3488)):
            Circle(SKETCH14_R)
    extrude(amount=LED_KINGBRIGHT_3P_2P54_13_DEPTH)


with BuildPart() as body_15:
    # Sketch15 → LED-KINGBRIGHT_3P_2P54-14 (new body)
    with BuildSketch(Plane.XY.offset(1.592072)):
        with Locations((65.2722088, 98.3488)):
            Circle(SKETCH15_R)
    extrude(amount=LED_KINGBRIGHT_3P_2P54_14_DEPTH)


with BuildPart() as body_16:
    # Sketch16 → LED-KINGBRIGHT_3P_2P54-15 (new body)
    with BuildSketch(Plane.XY.offset(1.592072)):
        with Locations((46.8347044, 98.3488)):
            Circle(SKETCH16_R)
    extrude(amount=LED_KINGBRIGHT_3P_2P54_15_DEPTH)


with BuildPart() as body_17:
    # Sketch17 → LED-KINGBRIGHT_3P_2P54-16 (new body)
    with BuildSketch(Plane.XY.offset(1.592072)):
        with Locations((28.3972, 98.3488)):
            Circle(SKETCH17_R)
    extrude(amount=LED_KINGBRIGHT_3P_2P54_16_DEPTH)


with BuildPart() as body_18:
    # Sketch18 → SWITCH-MCDTS2-1 (new body)
    with BuildSketch(Plane.XY.offset(1.592072)):
        with Locations((139.0222264, 29.9593)):
            Rectangle(SKETCH18_W, SKETCH18_H)
    extrude(amount=SWITCH_MCDTS2_1_DEPTH)


with BuildPart() as body_19:
    # Sketch19 → SWITCH-MCDTS2-2 (new body)
    with BuildSketch(Plane.XY.offset(1.592072)):
        with Locations((120.584722, 29.9593)):
            Rectangle(SKETCH19_W, SKETCH19_H)
    extrude(amount=SWITCH_MCDTS2_2_DEPTH)


with BuildPart() as body_20:
    # Sketch20 → SWITCH-MCDTS2-3 (new body)
    with BuildSketch(Plane.XY.offset(1.592072)):
        with Locations((102.1472176, 29.9593)):
            Rectangle(SKETCH20_W, SKETCH20_H)
    extrude(amount=SWITCH_MCDTS2_3_DEPTH)


with BuildPart() as body_21:
    # Sketch21 → SWITCH-MCDTS2-4 (new body)
    with BuildSketch(Plane.XY.offset(1.592072)):
        with Locations((83.7097132, 29.9593)):
            Rectangle(SKETCH21_W, SKETCH21_H)
    extrude(amount=SWITCH_MCDTS2_4_DEPTH)


with BuildPart() as body_22:
    # Sketch22 → SWITCH-MCDTS2-5 (new body)
    with BuildSketch(Plane.XY.offset(1.592072)):
        with Locations((65.2722088, 29.9593)):
            Rectangle(SKETCH22_W, SKETCH22_H)
    extrude(amount=SWITCH_MCDTS2_5_DEPTH)


with BuildPart() as body_23:
    # Sketch23 → SWITCH-MCDTS2-6 (new body)
    with BuildSketch(Plane.XY.offset(1.592072)):
        with Locations((46.8347044, 29.9593)):
            Rectangle(SKETCH23_W, SKETCH23_H)
    extrude(amount=SWITCH_MCDTS2_6_DEPTH)


with BuildPart() as body_24:
    # Sketch24 → SWITCH-MCDTS2-7 (new body)
    with BuildSketch(Plane.XY.offset(1.592072)):
        with Locations((28.3972, 29.9593)):
            Rectangle(SKETCH24_W, SKETCH24_H)
    extrude(amount=SWITCH_MCDTS2_7_DEPTH)


with BuildPart() as body_25:
    # Sketch25 → SWITCH-MCDTS2-8 (new body)
    with BuildSketch(Plane.XY.offset(1.592072)):
        with Locations((139.0222264, 58.5343)):
            Rectangle(SKETCH25_W, SKETCH25_H)
    extrude(amount=SWITCH_MCDTS2_8_DEPTH)


with BuildPart() as body_26:
    # Sketch26 → SWITCH-MCDTS2-9 (new body)
    with BuildSketch(Plane.XY.offset(1.592072)):
        with Locations((120.584722, 58.5343)):
            Rectangle(SKETCH26_W, SKETCH26_H)
    extrude(amount=SWITCH_MCDTS2_9_DEPTH)


with BuildPart() as body_27:
    # Sketch27 → SWITCH-MCDTS2-10 (new body)
    with BuildSketch(Plane.XY.offset(1.592072)):
        with Locations((102.1472176, 58.5343)):
            Rectangle(SKETCH27_W, SKETCH27_H)
    extrude(amount=SWITCH_MCDTS2_10_DEPTH)


with BuildPart() as body_28:
    # Sketch28 → SWITCH-MCDTS2-11 (new body)
    with BuildSketch(Plane.XY.offset(1.592072)):
        with Locations((83.7097132, 58.5343)):
            Rectangle(SKETCH28_W, SKETCH28_H)
    extrude(amount=SWITCH_MCDTS2_11_DEPTH)


with BuildPart() as body_29:
    # Sketch29 → SWITCH-MCDTS2-12 (new body)
    with BuildSketch(Plane.XY.offset(1.592072)):
        with Locations((65.2722088, 58.5343)):
            Rectangle(SKETCH29_W, SKETCH29_H)
    extrude(amount=SWITCH_MCDTS2_12_DEPTH)


with BuildPart() as body_30:
    # Sketch30 → SWITCH-MCDTS2-13 (new body)
    with BuildSketch(Plane.XY.offset(1.592072)):
        with Locations((46.8347044, 58.5343)):
            Rectangle(SKETCH30_W, SKETCH30_H)
    extrude(amount=SWITCH_MCDTS2_13_DEPTH)


with BuildPart() as body_31:
    # Sketch31 → SWITCH-MCDTS2-14 (new body)
    with BuildSketch(Plane.XY.offset(1.592072)):
        with Locations((28.3972, 58.5343)):
            Rectangle(SKETCH31_W, SKETCH31_H)
    extrude(amount=SWITCH_MCDTS2_14_DEPTH)


with BuildPart() as body_32:
    # Sketch32 → SWITCH-MCDTS2-15 (new body)
    with BuildSketch(Plane.XY.offset(1.592072)):
        with Locations((157.4597308, 87.1093)):
            Rectangle(SKETCH32_W, SKETCH32_H)
    extrude(amount=SWITCH_MCDTS2_15_DEPTH)


with BuildPart() as body_33:
    # Sketch33 → SWITCH-MCDTS2-16 (new body)
    with BuildSketch(Plane.XY.offset(1.592072)):
        with Locations((139.0222264, 87.1093)):
            Rectangle(SKETCH33_W, SKETCH33_H)
    extrude(amount=SWITCH_MCDTS2_16_DEPTH)


with BuildPart() as body_34:
    # Sketch34 → SWITCH-MCDTS2-17 (new body)
    with BuildSketch(Plane.XY.offset(1.592072)):
        with Locations((120.584722, 87.1093)):
            Rectangle(SKETCH34_W, SKETCH34_H)
    extrude(amount=SWITCH_MCDTS2_17_DEPTH)


with BuildPart() as body_35:
    # Sketch35 → SWITCH-MCDTS2-18 (new body)
    with BuildSketch(Plane.XY.offset(1.592072)):
        with Locations((102.1472176, 87.1093)):
            Rectangle(SKETCH35_W, SKETCH35_H)
    extrude(amount=SWITCH_MCDTS2_18_DEPTH)


with BuildPart() as body_36:
    # Sketch36 → SWITCH-MCDTS2-19 (new body)
    with BuildSketch(Plane.XY.offset(1.592072)):
        with Locations((83.7097132, 87.1093)):
            Rectangle(SKETCH36_W, SKETCH36_H)
    extrude(amount=SWITCH_MCDTS2_19_DEPTH)


with BuildPart() as body_37:
    # Sketch37 → SWITCH-MCDTS2-20 (new body)
    with BuildSketch(Plane.XY.offset(1.592072)):
        with Locations((65.2722088, 87.1093)):
            Rectangle(SKETCH37_W, SKETCH37_H)
    extrude(amount=SWITCH_MCDTS2_20_DEPTH)


with BuildPart() as body_38:
    # Sketch38 → SWITCH-MCDTS2-21 (new body)
    with BuildSketch(Plane.XY.offset(1.592072)):
        with Locations((46.8347044, 87.1093)):
            Rectangle(SKETCH38_W, SKETCH38_H)
    extrude(amount=SWITCH_MCDTS2_21_DEPTH)


with BuildPart() as body_39:
    # Sketch39 → SWITCH-MCDTS2-22 (new body)
    with BuildSketch(Plane.XY.offset(1.592072)):
        with Locations((28.3972, 87.1093)):
            Rectangle(SKETCH39_W, SKETCH39_H)
    extrude(amount=SWITCH_MCDTS2_22_DEPTH)


solid = Compound([part.part, body_2.part, body_3.part, body_4.part, body_5.part, body_6.part, body_7.part, body_8.part, body_9.part, body_10.part, body_11.part, body_12.part, body_13.part, body_14.part, body_15.part, body_16.part, body_17.part, body_18.part, body_19.part, body_20.part, body_21.part, body_22.part, body_23.part, body_24.part, body_25.part, body_26.part, body_27.part, body_28.part, body_29.part, body_30.part, body_31.part, body_32.part, body_33.part, body_34.part, body_35.part, body_36.part, body_37.part, body_38.part, body_39.part])
